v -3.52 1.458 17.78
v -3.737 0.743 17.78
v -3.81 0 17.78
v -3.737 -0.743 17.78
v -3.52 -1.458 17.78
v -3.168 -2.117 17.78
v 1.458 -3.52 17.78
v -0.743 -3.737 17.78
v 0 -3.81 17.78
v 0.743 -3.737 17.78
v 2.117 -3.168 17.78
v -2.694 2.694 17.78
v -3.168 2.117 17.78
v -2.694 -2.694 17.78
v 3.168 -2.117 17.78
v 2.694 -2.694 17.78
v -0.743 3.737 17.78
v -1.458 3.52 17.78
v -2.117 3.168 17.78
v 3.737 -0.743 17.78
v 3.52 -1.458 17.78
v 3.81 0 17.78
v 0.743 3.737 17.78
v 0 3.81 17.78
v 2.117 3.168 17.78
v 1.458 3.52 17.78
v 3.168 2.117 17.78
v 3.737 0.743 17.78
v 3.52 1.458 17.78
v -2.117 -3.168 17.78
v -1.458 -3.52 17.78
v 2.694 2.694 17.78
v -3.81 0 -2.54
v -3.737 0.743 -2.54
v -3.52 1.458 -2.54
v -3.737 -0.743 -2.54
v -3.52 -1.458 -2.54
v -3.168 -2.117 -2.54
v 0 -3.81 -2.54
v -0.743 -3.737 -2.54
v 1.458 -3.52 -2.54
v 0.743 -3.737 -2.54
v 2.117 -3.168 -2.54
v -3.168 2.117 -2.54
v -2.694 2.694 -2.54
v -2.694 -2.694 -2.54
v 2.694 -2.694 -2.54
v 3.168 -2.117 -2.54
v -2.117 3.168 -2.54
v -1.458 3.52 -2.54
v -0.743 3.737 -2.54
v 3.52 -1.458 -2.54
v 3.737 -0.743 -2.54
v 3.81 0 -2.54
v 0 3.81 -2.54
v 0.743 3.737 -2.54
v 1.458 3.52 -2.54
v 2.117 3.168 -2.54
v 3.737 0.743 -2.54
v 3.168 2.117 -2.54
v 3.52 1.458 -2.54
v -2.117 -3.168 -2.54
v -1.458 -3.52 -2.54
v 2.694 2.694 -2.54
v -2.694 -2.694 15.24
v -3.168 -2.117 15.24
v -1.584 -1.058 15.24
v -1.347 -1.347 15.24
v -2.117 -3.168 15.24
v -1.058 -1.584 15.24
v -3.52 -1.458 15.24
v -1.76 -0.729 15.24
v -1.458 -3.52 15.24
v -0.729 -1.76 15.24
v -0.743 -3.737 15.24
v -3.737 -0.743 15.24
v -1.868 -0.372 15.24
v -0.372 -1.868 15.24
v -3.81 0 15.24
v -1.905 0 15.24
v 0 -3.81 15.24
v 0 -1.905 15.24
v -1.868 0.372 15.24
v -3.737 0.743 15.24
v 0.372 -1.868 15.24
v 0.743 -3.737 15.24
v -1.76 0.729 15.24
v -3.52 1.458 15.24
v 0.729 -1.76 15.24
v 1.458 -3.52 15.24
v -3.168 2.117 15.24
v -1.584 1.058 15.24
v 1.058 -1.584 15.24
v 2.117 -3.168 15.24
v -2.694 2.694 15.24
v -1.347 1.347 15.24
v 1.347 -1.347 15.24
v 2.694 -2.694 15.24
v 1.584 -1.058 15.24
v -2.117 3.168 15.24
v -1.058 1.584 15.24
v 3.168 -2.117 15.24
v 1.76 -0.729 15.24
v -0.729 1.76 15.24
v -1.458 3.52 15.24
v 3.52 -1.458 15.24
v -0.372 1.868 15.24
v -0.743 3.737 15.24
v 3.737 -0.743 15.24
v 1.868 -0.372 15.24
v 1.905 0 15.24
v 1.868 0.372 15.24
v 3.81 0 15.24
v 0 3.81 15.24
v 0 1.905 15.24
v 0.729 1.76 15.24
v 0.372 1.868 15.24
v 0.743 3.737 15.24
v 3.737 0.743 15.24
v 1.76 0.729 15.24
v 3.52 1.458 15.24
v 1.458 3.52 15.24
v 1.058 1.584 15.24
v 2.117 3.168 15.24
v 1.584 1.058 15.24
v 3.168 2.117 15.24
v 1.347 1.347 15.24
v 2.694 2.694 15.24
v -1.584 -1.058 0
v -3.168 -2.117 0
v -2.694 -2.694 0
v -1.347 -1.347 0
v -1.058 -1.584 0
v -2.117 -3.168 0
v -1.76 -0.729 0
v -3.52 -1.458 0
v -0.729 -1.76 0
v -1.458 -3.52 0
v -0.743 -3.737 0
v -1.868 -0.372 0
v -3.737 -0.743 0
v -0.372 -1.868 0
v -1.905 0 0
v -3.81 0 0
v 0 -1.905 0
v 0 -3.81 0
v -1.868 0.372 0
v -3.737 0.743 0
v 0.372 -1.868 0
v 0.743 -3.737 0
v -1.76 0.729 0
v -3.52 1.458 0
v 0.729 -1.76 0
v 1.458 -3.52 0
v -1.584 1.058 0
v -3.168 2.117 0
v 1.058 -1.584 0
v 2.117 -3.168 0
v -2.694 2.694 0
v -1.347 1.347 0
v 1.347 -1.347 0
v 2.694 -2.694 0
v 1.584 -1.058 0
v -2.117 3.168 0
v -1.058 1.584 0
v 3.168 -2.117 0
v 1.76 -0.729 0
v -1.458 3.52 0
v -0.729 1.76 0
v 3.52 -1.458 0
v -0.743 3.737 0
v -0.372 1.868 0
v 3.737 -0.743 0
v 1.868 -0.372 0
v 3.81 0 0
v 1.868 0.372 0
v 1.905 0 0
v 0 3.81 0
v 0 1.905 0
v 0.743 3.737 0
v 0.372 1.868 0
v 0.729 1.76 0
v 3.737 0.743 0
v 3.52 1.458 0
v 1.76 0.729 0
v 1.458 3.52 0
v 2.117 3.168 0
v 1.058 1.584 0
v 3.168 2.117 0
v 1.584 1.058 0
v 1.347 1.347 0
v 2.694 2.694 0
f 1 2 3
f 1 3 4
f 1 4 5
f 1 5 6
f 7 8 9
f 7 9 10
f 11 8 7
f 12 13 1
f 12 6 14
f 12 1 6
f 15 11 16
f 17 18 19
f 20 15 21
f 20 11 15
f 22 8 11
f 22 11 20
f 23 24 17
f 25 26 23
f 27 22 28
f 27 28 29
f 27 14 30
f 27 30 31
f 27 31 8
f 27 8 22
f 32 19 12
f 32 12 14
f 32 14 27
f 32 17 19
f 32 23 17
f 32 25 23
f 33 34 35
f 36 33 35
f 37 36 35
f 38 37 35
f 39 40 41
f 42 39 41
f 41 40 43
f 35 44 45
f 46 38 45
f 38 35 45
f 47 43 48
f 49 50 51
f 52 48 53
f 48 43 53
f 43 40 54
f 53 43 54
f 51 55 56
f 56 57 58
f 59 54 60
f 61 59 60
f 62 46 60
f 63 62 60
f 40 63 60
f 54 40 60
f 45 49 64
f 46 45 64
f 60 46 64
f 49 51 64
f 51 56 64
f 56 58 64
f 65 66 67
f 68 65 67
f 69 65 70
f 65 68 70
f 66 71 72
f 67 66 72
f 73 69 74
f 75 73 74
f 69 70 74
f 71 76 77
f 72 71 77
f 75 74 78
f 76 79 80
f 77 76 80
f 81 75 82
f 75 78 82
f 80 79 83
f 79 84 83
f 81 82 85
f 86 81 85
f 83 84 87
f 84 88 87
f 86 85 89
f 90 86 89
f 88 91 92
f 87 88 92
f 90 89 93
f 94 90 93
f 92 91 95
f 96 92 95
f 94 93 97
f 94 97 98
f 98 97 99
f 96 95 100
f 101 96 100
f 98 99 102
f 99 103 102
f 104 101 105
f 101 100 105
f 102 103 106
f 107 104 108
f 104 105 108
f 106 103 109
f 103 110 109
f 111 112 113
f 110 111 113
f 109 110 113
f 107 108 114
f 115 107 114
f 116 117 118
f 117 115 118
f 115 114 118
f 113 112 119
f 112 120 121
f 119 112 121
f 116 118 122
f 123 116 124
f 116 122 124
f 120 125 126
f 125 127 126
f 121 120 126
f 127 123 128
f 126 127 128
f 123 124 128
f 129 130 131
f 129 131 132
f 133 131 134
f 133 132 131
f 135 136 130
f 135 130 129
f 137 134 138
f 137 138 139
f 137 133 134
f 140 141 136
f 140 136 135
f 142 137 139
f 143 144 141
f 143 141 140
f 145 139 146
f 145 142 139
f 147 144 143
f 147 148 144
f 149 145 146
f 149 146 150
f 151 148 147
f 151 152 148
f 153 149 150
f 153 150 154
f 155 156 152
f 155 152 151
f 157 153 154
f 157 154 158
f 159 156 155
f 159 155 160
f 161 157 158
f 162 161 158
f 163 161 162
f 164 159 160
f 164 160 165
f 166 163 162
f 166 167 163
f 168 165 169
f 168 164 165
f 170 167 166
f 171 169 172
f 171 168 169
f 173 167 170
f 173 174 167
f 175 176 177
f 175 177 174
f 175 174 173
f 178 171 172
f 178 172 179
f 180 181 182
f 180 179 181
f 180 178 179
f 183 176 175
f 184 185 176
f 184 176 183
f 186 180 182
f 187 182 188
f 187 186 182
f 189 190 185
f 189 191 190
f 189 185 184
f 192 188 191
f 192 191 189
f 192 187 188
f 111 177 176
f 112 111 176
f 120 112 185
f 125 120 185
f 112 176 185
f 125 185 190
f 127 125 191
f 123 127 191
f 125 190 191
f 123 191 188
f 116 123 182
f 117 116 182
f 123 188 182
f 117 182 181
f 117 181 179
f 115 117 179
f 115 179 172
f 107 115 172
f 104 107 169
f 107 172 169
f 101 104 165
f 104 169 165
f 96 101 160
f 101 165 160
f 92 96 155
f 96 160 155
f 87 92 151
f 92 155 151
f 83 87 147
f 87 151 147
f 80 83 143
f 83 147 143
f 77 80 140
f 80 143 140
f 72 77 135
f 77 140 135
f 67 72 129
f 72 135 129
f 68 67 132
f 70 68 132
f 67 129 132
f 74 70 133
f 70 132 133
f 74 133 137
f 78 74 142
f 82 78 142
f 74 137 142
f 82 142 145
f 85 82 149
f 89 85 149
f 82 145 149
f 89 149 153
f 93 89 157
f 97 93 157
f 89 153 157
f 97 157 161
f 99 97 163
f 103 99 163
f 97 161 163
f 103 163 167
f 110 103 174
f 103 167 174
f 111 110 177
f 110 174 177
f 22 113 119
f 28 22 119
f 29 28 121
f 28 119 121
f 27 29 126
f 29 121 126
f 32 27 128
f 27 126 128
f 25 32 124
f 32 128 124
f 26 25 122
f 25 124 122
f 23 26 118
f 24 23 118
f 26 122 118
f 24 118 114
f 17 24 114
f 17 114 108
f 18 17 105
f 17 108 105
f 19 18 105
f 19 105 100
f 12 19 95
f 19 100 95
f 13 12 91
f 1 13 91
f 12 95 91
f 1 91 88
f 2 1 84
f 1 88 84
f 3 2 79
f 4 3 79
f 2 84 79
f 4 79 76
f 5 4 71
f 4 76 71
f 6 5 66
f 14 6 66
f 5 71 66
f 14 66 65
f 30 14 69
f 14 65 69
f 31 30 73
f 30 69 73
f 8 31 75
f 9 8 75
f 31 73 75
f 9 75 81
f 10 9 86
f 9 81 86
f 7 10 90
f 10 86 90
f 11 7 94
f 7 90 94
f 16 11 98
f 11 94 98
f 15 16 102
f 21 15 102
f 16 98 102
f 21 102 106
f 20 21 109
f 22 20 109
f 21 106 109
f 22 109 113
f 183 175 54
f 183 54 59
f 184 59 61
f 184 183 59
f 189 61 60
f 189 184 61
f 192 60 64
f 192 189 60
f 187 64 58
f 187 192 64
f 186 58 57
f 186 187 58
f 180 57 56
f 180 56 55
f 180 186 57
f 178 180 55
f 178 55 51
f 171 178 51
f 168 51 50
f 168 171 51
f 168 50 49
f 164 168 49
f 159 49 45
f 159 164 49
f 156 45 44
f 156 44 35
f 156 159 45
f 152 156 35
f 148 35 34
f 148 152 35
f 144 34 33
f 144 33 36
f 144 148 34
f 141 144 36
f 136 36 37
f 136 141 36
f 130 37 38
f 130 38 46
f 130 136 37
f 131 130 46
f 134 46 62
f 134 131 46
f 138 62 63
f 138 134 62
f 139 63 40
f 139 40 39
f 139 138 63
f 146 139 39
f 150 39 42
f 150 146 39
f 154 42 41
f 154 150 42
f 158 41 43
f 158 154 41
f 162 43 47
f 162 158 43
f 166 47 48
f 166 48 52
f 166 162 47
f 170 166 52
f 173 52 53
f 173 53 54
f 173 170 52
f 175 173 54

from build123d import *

# Parameters (mm, degrees)
SKETCH1_R           = 1.905
BOSS_EXTRUDE1_DEPTH = 15.24
SKETCH3_R           = 3.81
BOSS_EXTRUDE2_DEPTH = 2.54


with BuildPart() as part:
    # Sketch1 → Boss-Extrude1 (new body)
    with BuildSketch(Plane.XY):
        Circle(SKETCH1_R)
    extrude(amount=BOSS_EXTRUDE1_DEPTH)

    # Sketch3 → Boss-Extrude2 (add)
    with BuildSketch(Plane.XY.offset(15.24)):
        Circle(SKETCH3_R)
    boss_extrude2 = extrude(amount=BOSS_EXTRUDE2_DEPTH)

    # Mirror1: Boss-Extrude2 across plane
    add(boss_extrude2.mirror(Plane.XY.offset(7.62)))


solid = part.part
